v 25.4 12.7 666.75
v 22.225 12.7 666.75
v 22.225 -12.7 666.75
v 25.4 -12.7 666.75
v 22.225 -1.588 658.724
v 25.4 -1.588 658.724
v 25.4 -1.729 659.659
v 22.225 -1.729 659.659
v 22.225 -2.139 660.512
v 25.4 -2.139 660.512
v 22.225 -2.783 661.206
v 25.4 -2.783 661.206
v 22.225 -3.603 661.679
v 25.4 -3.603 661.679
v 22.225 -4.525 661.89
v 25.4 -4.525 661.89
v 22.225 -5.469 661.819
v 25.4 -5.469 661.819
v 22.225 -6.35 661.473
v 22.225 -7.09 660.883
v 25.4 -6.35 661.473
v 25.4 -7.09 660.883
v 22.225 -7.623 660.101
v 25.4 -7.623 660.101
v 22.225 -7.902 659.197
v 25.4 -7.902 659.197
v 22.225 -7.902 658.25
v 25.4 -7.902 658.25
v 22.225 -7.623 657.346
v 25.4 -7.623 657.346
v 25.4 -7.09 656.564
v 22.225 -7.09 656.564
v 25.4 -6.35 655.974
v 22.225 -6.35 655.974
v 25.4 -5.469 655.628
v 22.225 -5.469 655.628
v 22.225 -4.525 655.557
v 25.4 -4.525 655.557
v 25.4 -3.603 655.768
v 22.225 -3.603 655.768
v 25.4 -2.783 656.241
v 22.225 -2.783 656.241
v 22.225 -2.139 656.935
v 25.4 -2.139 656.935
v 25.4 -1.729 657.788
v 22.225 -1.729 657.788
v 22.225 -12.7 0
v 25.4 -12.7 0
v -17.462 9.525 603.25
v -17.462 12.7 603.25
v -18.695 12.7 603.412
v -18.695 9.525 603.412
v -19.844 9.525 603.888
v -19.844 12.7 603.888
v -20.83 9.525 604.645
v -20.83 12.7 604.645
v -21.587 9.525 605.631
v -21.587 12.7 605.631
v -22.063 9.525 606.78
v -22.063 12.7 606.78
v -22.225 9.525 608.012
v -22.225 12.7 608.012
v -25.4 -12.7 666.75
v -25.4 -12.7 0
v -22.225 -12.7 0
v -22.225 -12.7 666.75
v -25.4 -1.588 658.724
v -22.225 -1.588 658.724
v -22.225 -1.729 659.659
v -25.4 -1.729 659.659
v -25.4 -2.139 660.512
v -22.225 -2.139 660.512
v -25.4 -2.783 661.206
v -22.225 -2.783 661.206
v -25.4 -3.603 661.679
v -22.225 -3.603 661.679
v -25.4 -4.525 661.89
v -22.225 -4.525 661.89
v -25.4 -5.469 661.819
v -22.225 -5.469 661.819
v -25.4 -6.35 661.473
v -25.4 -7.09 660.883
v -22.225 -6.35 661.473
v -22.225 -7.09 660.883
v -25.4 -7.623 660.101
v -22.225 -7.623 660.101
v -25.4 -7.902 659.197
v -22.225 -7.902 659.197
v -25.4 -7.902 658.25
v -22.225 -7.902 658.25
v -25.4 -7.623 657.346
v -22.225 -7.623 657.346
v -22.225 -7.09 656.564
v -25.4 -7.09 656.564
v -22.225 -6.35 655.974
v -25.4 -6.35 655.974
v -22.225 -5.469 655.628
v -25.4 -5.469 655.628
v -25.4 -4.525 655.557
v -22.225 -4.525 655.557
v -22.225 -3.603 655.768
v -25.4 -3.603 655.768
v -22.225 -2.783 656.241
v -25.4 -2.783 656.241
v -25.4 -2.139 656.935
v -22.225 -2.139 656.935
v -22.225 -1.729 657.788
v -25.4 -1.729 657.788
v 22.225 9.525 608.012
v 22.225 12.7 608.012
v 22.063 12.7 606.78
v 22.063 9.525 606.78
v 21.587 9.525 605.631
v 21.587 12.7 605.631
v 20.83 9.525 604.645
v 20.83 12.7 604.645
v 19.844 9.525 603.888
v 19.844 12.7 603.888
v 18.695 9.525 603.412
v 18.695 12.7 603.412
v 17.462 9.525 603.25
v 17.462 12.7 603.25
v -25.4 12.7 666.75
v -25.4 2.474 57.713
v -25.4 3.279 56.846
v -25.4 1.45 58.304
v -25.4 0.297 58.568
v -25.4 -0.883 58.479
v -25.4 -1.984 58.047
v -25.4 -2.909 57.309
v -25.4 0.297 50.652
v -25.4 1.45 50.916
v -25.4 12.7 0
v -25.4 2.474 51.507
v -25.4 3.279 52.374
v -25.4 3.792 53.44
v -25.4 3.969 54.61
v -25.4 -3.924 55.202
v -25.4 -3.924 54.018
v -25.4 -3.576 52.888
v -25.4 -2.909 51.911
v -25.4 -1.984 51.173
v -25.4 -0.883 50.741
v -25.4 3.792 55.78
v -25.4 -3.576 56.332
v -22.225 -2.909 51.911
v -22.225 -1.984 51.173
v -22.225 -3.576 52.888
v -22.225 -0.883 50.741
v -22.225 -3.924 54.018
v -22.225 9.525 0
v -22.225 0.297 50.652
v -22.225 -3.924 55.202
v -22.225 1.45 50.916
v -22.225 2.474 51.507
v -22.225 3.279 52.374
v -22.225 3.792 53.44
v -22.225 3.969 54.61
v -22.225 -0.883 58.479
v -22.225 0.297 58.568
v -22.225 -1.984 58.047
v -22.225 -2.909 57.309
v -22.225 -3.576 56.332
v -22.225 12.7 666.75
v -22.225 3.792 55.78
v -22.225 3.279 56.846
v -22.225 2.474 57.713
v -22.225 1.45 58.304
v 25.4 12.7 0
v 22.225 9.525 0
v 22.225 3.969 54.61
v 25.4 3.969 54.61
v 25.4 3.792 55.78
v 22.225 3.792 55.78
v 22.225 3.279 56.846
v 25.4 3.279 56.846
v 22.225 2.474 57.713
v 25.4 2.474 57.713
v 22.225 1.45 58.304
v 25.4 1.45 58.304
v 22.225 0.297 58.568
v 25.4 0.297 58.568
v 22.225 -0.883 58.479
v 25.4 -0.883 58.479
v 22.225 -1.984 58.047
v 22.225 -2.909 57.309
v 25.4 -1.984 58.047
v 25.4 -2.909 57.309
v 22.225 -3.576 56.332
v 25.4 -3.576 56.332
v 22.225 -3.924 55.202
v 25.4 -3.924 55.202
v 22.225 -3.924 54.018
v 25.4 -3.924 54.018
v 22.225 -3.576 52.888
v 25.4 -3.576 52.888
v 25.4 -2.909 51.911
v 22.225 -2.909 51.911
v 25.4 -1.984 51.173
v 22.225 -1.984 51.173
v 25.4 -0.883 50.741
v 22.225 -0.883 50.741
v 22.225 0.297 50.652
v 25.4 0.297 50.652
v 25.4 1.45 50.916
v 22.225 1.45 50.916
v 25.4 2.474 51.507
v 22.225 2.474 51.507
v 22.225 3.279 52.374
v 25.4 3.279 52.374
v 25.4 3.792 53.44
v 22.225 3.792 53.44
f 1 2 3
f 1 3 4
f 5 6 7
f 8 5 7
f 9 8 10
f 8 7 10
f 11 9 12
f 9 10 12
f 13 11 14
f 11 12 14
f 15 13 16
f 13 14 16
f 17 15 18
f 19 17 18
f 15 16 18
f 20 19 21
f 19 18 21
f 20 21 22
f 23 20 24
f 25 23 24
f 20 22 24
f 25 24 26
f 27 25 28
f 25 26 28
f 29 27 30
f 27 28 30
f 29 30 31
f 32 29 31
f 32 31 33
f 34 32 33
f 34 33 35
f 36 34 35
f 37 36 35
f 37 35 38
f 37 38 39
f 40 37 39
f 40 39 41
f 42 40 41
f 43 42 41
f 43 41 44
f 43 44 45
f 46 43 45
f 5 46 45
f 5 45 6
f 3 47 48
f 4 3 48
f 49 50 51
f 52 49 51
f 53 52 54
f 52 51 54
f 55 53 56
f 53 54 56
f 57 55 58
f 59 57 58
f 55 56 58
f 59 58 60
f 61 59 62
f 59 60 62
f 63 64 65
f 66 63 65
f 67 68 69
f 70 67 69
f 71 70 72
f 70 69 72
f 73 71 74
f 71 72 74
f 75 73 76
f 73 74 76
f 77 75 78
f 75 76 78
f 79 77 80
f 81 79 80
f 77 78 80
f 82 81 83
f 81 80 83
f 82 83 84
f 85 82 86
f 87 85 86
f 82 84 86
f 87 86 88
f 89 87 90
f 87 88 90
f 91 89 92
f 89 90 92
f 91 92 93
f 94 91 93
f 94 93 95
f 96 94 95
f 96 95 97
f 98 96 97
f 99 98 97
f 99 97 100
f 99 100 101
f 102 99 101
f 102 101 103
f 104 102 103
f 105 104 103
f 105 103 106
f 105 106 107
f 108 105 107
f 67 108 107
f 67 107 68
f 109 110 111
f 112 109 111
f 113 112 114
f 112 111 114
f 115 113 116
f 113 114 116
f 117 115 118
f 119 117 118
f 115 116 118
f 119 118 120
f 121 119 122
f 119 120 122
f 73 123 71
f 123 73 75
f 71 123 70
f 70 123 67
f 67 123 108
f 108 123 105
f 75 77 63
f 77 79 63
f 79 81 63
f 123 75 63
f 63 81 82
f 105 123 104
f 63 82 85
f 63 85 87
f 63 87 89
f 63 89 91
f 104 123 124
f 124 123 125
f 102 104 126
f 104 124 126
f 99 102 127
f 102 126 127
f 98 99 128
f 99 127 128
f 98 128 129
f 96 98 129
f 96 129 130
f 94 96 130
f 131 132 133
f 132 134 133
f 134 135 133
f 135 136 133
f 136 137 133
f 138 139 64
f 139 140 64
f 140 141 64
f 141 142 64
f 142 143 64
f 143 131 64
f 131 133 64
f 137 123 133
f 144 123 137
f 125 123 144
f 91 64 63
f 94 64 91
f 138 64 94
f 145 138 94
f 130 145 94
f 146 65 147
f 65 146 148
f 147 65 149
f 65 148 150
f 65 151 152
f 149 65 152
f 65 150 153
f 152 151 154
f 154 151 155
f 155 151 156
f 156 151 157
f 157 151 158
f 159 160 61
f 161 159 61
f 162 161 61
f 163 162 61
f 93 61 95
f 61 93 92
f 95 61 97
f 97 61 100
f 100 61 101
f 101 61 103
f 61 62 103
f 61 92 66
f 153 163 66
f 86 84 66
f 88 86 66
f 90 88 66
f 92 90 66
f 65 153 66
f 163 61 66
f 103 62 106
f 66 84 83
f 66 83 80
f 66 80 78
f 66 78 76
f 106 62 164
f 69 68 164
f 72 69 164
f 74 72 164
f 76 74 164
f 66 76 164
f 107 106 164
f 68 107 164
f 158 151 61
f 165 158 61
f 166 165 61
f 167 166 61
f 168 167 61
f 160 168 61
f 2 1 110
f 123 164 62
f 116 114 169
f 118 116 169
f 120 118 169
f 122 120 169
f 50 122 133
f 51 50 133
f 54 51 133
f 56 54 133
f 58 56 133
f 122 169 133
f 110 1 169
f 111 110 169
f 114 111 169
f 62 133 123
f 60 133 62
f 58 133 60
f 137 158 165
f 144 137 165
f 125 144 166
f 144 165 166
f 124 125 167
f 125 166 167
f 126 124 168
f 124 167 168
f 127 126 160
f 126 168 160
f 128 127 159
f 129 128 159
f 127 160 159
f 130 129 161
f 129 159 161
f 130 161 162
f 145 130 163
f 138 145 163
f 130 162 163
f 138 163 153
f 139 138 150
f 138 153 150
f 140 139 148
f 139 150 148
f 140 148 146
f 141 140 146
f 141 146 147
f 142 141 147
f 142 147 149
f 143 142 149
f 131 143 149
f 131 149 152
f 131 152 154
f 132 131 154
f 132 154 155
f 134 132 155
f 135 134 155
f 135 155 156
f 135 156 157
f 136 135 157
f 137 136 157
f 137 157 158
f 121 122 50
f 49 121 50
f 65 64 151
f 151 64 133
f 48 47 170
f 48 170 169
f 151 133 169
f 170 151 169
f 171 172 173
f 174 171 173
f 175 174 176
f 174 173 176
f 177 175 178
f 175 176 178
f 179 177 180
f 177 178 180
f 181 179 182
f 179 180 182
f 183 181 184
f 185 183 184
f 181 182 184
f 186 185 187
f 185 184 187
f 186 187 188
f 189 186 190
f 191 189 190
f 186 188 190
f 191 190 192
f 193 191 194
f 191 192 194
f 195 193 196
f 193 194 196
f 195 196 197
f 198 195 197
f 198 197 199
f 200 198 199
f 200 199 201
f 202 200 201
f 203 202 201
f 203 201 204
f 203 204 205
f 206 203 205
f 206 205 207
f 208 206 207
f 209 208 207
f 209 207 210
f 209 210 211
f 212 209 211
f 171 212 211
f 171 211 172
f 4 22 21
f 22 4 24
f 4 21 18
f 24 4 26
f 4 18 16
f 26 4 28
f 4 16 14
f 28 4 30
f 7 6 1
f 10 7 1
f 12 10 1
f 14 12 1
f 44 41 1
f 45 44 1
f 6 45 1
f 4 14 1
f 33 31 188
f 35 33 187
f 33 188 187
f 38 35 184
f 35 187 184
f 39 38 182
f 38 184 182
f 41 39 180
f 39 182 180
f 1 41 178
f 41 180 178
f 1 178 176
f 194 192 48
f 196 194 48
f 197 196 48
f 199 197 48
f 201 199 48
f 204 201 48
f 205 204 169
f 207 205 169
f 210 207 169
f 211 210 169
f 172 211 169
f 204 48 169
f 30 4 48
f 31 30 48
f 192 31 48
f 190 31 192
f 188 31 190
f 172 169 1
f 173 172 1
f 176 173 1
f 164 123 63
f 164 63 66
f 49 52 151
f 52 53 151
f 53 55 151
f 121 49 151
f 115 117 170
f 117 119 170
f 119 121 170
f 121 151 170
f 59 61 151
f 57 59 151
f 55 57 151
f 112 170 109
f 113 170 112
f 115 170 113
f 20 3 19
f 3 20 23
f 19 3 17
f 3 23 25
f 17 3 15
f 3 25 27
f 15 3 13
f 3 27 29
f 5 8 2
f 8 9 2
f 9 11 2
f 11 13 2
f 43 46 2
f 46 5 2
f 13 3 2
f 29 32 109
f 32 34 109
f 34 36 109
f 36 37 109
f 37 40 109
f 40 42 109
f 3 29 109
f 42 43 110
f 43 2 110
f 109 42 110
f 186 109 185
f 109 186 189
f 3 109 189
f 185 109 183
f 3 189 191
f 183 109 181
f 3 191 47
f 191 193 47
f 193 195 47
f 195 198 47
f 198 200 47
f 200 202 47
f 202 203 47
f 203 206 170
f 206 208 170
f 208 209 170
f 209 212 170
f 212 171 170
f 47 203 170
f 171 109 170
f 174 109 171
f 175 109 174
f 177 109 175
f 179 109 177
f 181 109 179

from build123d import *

# Parameters (mm, degrees)
F1_DEPTH = 666.75
F2_R     = 3.96875
F3_DEPTH = 50.8
F4_R     = 3.175
F5_DEPTH = 50.8
F7_DEPTH = 25.4
F8_DEPTH = 25.4


with BuildPart() as f1:
    # F0 (on Top) → F1 (new body)
    with BuildSketch(Plane.XY):
        Polygon((-25.4, 12.7), (-25.4, -12.7), (-22.225, -12.7), (-22.225, 9.525), (22.225, 9.525), (22.225, -12.7), (25.4, -12.7), (25.4, 12.7), align=None)
    extrude(amount=F1_DEPTH)

    # F2 (on face) → F3 (cut, through all)
    with BuildSketch(Plane.YZ.offset(25.4)):
        with Locations((0, 16.51)):
            Circle(F2_R)
        with Locations((0, 54.61)):
            Circle(F2_R)
    extrude(amount=-F3_DEPTH, mode=Mode.SUBTRACT)

    # F4 (on face) → F5 (cut, through all)
    with BuildSketch(Plane.YZ.offset(25.4)):
        with Locations((-4.7625, 658.7236)):
            Circle(F4_R)
    extrude(amount=-F5_DEPTH, mode=Mode.SUBTRACT)

    # F6 (on face) → F7 (cut)
    with BuildSketch(Plane(origin=(0, 12.7, 0), x_dir=(-1, 0, 0), z_dir=(0, 1, 0))):
        with BuildLine():
            Line((22.225, 666.75), (-22.225, 666.75))
            Line((-22.225, 666.75), (-22.225, 608.0125))
            ThreePointArc((-22.225, 608.0125), (-20.830096, 604.644904), (-17.4625, 603.25))
            Line((-17.4625, 603.25), (17.4625, 603.25))
            ThreePointArc((17.4625, 603.25), (20.830096, 604.644904), (22.225, 608.0125))
            Line((22.225, 608.0125), (22.225, 666.75))
        make_face()
    extrude(amount=-F7_DEPTH, mode=Mode.SUBTRACT)

    # F0 (on Top) → F8 (join)
    with BuildSketch(Plane.XY):
        Polygon((-25.4, 12.7), (-25.4, -12.7), (-22.225, -12.7), (-22.225, 9.525), (22.225, 9.525), (22.225, -12.7), (25.4, -12.7), (25.4, 12.7), align=None)
    extrude(amount=F8_DEPTH)


solid = f1.part
